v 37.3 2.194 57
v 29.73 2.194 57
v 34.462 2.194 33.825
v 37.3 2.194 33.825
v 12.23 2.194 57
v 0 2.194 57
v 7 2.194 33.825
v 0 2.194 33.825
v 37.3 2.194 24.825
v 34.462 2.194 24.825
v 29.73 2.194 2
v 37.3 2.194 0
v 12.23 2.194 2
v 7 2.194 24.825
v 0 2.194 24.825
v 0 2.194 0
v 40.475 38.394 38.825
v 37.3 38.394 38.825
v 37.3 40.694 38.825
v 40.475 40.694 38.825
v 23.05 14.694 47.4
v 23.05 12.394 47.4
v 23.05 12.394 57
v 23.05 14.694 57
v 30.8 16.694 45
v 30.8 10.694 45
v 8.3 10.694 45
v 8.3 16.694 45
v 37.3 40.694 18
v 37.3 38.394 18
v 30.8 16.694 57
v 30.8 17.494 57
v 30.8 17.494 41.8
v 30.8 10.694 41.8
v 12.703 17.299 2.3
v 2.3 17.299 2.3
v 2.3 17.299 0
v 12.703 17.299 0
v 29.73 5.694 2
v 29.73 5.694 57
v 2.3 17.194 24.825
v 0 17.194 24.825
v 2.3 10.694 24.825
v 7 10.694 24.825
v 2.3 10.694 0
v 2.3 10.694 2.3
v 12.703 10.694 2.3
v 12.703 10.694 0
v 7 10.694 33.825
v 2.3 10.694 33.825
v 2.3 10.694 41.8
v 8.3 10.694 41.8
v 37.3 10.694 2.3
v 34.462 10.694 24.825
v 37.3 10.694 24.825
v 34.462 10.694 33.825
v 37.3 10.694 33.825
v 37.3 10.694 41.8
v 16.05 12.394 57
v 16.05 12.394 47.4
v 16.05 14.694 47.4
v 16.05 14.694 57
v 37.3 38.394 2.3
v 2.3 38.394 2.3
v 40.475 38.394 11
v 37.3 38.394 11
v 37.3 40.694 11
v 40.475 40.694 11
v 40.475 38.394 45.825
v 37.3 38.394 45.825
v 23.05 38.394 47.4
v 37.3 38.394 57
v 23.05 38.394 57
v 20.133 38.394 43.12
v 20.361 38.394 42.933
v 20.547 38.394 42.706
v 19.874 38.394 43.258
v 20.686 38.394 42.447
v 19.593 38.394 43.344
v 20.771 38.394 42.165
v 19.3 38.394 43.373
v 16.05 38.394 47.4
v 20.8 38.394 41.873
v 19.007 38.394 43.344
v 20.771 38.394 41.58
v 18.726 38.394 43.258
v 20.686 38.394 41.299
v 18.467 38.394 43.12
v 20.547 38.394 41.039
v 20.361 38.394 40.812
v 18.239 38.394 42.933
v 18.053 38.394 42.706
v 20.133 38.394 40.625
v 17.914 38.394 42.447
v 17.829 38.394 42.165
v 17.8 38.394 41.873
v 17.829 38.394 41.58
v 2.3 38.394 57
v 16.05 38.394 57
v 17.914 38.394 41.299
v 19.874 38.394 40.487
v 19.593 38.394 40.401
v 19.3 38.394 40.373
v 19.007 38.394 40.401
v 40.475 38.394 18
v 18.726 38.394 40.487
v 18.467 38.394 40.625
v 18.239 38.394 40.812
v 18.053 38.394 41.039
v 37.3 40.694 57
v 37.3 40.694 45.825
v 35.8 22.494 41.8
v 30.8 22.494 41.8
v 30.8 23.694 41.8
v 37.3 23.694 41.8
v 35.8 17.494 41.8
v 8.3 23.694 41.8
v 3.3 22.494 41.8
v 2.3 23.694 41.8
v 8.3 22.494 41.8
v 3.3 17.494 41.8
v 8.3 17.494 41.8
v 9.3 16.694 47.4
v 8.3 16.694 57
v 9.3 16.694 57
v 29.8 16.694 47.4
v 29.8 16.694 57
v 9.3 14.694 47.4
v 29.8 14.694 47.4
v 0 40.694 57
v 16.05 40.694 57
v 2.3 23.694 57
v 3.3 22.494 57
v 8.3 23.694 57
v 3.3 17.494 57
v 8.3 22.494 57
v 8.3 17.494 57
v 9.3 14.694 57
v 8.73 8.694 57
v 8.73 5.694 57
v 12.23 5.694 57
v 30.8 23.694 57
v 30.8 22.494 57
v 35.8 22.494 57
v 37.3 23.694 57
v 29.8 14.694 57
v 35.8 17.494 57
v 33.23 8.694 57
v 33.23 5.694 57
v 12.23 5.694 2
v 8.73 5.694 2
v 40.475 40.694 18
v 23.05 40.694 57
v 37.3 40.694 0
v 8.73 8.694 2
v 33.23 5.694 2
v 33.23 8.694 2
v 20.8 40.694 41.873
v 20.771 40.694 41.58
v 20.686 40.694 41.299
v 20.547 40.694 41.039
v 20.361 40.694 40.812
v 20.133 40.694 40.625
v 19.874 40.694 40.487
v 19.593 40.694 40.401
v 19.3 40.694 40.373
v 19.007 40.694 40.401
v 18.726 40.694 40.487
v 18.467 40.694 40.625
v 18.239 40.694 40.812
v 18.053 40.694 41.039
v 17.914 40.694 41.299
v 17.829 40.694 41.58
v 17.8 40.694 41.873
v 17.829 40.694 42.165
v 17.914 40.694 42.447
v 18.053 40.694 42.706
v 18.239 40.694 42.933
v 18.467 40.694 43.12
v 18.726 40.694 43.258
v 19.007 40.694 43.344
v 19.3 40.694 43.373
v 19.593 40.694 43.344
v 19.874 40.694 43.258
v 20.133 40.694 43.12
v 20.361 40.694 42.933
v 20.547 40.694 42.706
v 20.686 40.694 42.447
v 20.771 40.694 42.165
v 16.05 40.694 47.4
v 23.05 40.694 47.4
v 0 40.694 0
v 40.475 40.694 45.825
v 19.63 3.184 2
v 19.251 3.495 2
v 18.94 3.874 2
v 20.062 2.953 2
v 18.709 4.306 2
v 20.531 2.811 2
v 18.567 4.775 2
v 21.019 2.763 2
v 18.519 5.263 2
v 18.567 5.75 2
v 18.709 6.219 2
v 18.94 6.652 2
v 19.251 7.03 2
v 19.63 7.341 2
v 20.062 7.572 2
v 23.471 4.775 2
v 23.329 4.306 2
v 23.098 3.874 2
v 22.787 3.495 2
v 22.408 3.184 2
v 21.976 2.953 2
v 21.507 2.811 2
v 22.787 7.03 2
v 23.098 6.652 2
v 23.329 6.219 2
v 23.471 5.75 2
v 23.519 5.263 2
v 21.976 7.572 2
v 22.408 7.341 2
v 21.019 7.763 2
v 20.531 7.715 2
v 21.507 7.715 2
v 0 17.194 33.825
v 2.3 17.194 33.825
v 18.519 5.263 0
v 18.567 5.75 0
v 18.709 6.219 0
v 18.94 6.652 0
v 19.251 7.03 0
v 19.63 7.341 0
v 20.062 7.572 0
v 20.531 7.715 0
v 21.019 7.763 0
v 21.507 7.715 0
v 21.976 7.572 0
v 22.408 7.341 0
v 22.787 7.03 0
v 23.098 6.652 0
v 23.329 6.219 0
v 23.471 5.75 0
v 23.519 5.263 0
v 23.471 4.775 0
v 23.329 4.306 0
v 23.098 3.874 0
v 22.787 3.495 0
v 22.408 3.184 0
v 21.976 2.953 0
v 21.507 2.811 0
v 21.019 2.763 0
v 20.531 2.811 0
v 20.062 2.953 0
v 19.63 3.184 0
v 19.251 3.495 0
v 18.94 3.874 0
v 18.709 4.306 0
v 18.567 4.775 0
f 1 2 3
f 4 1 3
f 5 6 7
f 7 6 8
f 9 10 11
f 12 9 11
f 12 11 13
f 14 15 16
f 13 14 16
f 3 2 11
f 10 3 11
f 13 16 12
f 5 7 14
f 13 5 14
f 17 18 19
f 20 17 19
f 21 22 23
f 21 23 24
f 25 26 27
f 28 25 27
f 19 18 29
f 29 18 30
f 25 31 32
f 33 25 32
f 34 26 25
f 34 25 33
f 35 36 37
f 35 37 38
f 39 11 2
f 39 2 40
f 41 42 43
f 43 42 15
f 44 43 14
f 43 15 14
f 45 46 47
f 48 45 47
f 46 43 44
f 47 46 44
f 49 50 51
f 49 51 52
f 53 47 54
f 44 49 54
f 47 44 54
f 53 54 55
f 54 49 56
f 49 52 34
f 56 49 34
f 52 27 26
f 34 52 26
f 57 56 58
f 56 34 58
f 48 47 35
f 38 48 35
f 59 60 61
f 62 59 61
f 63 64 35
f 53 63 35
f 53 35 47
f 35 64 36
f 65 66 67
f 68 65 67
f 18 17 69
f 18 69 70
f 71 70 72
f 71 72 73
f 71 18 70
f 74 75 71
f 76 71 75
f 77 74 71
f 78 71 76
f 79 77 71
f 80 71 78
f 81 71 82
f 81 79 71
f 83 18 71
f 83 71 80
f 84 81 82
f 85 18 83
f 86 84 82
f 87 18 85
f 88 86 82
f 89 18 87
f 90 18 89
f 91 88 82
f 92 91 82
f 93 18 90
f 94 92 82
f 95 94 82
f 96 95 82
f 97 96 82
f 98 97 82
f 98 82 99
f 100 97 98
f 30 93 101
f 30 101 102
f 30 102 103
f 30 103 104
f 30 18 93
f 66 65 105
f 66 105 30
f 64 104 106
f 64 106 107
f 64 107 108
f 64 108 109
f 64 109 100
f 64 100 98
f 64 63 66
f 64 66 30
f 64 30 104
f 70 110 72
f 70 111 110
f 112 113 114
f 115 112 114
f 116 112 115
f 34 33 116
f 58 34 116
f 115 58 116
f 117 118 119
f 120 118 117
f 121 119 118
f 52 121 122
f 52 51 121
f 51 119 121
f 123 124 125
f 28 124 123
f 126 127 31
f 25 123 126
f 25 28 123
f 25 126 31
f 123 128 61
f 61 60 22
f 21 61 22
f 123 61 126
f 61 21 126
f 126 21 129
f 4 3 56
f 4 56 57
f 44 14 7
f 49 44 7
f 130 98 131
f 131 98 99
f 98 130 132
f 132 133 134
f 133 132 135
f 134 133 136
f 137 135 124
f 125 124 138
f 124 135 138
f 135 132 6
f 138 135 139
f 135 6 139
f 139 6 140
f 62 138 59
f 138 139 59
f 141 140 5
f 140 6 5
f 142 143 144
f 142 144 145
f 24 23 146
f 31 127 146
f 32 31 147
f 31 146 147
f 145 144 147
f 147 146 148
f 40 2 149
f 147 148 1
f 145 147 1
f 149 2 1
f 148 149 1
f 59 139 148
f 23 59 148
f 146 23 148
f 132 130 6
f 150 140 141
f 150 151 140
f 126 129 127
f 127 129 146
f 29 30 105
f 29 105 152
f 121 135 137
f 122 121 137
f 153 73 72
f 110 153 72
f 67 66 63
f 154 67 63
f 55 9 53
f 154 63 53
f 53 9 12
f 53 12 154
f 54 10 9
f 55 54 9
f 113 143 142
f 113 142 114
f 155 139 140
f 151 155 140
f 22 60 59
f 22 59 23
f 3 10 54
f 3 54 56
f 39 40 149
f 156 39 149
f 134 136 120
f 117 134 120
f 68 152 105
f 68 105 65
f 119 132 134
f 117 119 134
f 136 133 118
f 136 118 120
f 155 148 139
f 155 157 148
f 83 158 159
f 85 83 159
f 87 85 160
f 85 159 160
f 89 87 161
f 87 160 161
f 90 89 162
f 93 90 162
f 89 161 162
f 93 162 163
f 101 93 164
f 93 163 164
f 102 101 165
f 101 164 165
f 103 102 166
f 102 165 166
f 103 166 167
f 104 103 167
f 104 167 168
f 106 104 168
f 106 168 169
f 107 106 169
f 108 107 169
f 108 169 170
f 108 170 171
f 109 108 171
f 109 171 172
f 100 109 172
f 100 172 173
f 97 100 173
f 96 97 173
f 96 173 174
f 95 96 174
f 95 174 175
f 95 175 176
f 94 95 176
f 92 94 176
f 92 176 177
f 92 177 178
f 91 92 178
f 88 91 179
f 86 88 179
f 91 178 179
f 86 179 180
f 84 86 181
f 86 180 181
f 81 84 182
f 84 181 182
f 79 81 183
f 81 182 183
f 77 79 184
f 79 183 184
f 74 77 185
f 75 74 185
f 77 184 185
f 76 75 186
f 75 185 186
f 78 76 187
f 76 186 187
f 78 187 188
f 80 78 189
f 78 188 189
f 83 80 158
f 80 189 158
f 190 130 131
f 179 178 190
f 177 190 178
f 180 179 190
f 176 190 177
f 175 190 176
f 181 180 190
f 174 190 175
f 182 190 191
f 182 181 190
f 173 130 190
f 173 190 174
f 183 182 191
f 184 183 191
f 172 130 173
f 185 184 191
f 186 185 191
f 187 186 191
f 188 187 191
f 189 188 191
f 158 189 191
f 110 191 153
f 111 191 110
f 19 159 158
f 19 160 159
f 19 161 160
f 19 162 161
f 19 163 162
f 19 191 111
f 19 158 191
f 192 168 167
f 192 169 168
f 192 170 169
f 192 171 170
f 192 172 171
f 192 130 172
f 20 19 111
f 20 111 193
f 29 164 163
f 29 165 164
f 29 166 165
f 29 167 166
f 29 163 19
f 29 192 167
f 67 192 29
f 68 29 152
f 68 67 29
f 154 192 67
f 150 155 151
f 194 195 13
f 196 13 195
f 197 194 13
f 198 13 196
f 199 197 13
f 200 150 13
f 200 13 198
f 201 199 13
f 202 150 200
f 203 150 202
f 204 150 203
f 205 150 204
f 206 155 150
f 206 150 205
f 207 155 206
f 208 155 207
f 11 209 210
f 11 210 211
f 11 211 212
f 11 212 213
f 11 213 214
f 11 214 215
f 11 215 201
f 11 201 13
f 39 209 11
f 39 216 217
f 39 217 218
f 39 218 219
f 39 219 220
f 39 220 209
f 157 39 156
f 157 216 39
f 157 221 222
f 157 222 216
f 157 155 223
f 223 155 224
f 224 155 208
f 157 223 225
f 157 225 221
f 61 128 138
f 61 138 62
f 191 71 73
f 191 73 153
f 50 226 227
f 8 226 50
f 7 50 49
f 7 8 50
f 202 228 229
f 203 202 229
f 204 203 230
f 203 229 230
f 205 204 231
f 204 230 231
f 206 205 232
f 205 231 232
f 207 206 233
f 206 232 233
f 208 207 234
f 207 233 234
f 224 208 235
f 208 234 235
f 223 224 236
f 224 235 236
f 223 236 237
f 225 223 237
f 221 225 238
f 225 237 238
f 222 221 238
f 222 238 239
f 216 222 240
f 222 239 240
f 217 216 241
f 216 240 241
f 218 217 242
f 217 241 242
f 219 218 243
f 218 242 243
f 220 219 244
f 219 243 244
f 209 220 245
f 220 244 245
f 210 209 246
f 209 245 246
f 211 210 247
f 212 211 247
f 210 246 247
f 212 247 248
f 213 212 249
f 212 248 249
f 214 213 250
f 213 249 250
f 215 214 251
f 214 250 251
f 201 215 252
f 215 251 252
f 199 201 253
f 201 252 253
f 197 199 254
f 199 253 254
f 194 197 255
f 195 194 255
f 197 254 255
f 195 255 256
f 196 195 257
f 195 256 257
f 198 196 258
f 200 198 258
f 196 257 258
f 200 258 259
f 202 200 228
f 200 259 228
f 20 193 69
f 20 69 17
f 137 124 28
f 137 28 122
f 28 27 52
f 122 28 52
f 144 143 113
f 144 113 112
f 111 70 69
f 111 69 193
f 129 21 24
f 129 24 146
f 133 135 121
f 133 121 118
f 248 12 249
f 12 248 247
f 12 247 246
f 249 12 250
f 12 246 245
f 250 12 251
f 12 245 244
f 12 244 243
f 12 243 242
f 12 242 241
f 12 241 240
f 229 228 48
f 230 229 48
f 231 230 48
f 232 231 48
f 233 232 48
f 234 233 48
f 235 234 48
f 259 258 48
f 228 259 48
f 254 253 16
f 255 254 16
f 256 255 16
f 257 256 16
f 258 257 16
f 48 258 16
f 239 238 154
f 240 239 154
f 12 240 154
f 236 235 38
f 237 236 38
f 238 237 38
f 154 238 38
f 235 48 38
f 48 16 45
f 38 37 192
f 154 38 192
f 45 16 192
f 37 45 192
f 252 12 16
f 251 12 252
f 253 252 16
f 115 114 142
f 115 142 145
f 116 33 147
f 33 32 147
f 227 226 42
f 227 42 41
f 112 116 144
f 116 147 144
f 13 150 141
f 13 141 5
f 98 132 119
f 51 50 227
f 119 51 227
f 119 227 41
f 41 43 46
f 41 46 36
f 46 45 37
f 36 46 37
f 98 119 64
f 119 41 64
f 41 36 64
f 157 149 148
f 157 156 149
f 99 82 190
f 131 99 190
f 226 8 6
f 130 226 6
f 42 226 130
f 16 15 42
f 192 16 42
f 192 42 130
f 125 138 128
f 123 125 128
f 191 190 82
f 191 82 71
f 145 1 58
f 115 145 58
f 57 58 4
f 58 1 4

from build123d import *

# Parameters (mm, degrees)
SKETCH1_W               = 53.825
SKETCH1_H               = 38.5
MAIN_EXTRUDE_DEPTH      = 2.3
WALLS_DEPTH             = 35
SKETCH36_W              = 7
SKETCH36_H              = 2.3
SKETCH36_W_2            = 2.3
SKETCH36_H_2            = 7
PUZZLE_MAIN_WALLS_DEPTH = 3.175
SKETCH25_W              = 10.403042977
SKETCH25_H              = 6.605151166
WIRE_HOLE_DEPTH         = 3.3
SKETCH19_W              = 6.5
SKETCH19_H              = 12.025
SKETCH19_W_2            = 6
IR_MOUNT_DEPTH          = 7
MAGNET_MOUNT_HOLE_DEPTH = 51.83
SKETCH40_R              = 1.5
LED_SPACE_DEPTH         = 3
SKETCH42_W              = 7
SKETCH42_H              = 2.3
BOSS_EXTRUDE15_DEPTH    = 3.175
SKETCH44_W              = 6
SKETCH44_H              = 12.025
SKETCH44_W_2            = 6.5
BOSS_EXTRUDE16_DEPTH    = 6
SKETCH45_W              = 5
SKETCH45_H              = 5
IR_PLACEMENT_DEPTH      = 12.025
SKETCH47_R              = 2.5
CUT_EXTRUDE2_DEPTH      = 2
SKETCH48_W              = 7
SKETCH48_H              = 9
CUT_EXTRUDE3_DEPTH      = 15
BOSS_EXTRUDE17_DEPTH    = 3.175
SKETCH51_W              = 22.5
SKETCH51_H              = 10
BOSS_EXTRUDE18_DEPTH    = 4
BOSS_EXTRUDE19_DEPTH    = 6
SKETCH54_W              = 7
SKETCH54_H              = 2.3
CUT_EXTRUDE5_DEPTH      = 9.6


with BuildPart() as part:
    # Sketch1 → main extrude (new body)
    with BuildSketch(Plane(origin=(0, 0, 0), x_dir=(0, 0, -1), z_dir=(1, 0, 0))):
        with Locations((-26.9125, 21.443980352)):
            Rectangle(SKETCH1_W, SKETCH1_H)
    extrude(amount=MAIN_EXTRUDE_DEPTH)

    # Sketch3 → walls (add)
    with BuildSketch(Plane(origin=(2.3, 0, 0), x_dir=(0, 0, -1), z_dir=(1, 0, 0))):
        Polygon((-2.3, 38.393980352), (-2.3, 10.693980352), (-53.825, 10.693980352), (-53.825, 2.193980352), (0, 2.193980352), (0, 40.693980352), (-53.825, 40.693980352), (-53.825, 38.393980352), align=None)
    extrude(amount=WALLS_DEPTH)

    # Sketch36 → Puzzle (main walls) (add)
    with BuildSketch(Plane.XY.offset(53.825)):
        with Locations((11.5, 39.543980352)):
            Rectangle(SKETCH36_W, SKETCH36_H)
        with Locations((26.5, 39.543980352)):
            Rectangle(SKETCH36_W, SKETCH36_H)
        with Locations((1.15, 29.193980352)):
            Rectangle(SKETCH36_W_2, SKETCH36_H_2)
        with Locations((1.15, 14.193980352)):
            Rectangle(SKETCH36_W_2, SKETCH36_H_2)
    extrude(amount=PUZZLE_MAIN_WALLS_DEPTH)

    # Sketch25 → Wire Hole (cut, through all)
    with BuildSketch(Plane.XY.offset(2.3)):
        with Locations((7.501521489, 13.996555935)):
            Rectangle(SKETCH25_W, SKETCH25_H)
    extrude(amount=-WIRE_HOLE_DEPTH, mode=Mode.SUBTRACT)

    # Sketch19 → IR mount (add)
    with BuildSketch(Plane(origin=(0, 10.693980352, 0), x_dir=(1, 0, 0), z_dir=(0, 1, 0))):
        with Locations((34.05, -47.8125)):
            Rectangle(SKETCH19_W, SKETCH19_H)
        with Locations((5.3, -47.8125)):
            Rectangle(SKETCH19_W_2, SKETCH19_H)
    extrude(amount=IR_MOUNT_DEPTH)

    # Sketch24 → Magnet Mount Hole (cut)
    with BuildSketch(Plane.XY.offset(53.83)):
        Polygon((12.23, 2.193980352), (29.73, 2.193980352), (29.73, 5.693980352), (33.23, 5.693980352), (33.23, 8.693980352), (8.73, 8.693980352), (8.73, 5.693980352), (12.23, 5.693980352), align=None)
    extrude(amount=-MAGNET_MOUNT_HOLE_DEPTH, mode=Mode.SUBTRACT)

    # Sketch40 → LED Space (cut)
    with BuildSketch(Plane(origin=(0, 40.693980352, 0), x_dir=(1, 0, 0), z_dir=(0, 1, 0))):
        with Locations((19.3, -41.872631961)):
            Circle(SKETCH40_R)
    extrude(amount=-LED_SPACE_DEPTH, mode=Mode.SUBTRACT)

    # Sketch42 → Boss-Extrude15 (add)
    with BuildSketch(Plane(origin=(37.3, 0, 0), x_dir=(0, 0, -1), z_dir=(1, 0, 0))):
        with Locations((-42.325, 39.543980352)):
            Rectangle(SKETCH42_W, SKETCH42_H)
        with Locations((-14.5, 39.543980352)):
            Rectangle(SKETCH42_W, SKETCH42_H)
    extrude(amount=BOSS_EXTRUDE15_DEPTH)

    # Sketch44 → Boss-Extrude16 (add)
    with BuildSketch(Plane(origin=(0, 17.693980352, 0), x_dir=(1, 0, 0), z_dir=(0, 1, 0))):
        with Locations((5.3, -47.8125)):
            Rectangle(SKETCH44_W, SKETCH44_H)
        with Locations((34.05, -47.8125)):
            Rectangle(SKETCH44_W_2, SKETCH44_H)
    extrude(amount=BOSS_EXTRUDE16_DEPTH)

    # Sketch45 → IR placement (cut)
    with BuildSketch(Plane.XY.offset(53.825)):
        with Locations((33.3, 19.993980352)):
            Rectangle(SKETCH45_W, SKETCH45_H)
        with Locations((5.8, 19.993980352)):
            Rectangle(SKETCH45_W, SKETCH45_H)
    extrude(amount=-IR_PLACEMENT_DEPTH, mode=Mode.SUBTRACT)

    # Sketch47 → Cut-Extrude2 (cut)
    with BuildSketch(Plane(origin=(0, 0, 0), x_dir=(-1, 0, 0), z_dir=(0, 0, -1))):
        with Locations((-21.018982331, 5.262699137)):
            Circle(SKETCH47_R)
    extrude(amount=-CUT_EXTRUDE2_DEPTH, mode=Mode.SUBTRACT)

    # Sketch48 → Cut-Extrude3 (cut)
    with BuildSketch(Plane.XZ.offset(-2.193980352)):
        with Locations((3.5, 29.325)):
            Rectangle(SKETCH48_W, SKETCH48_H)
        with Locations((37.962462444, 29.325)):
            Rectangle(SKETCH48_W, SKETCH48_H)
    extrude(amount=-CUT_EXTRUDE3_DEPTH, mode=Mode.SUBTRACT)

    # Sketch50 → Boss-Extrude17 (add)
    with BuildSketch(Plane.XY.offset(53.825)):
        Polygon((37.3, 38.393980352), (2.3, 38.393980352), (2.3, 23.693980352), (8.3, 23.693980352), (8.3, 22.493980352), (3.3, 22.493980352), (3.3, 17.493980352), (8.3, 17.493980352), (8.3, 10.693980352), (30.8, 10.693980352), (30.8, 17.493980352), (35.8, 17.493980352), (35.8, 22.493980352), (30.8, 22.493980352), (30.8, 23.693980352), (37.3, 23.693980352), (37.3, 2.193980352), (29.73, 2.193980352), (29.73, 5.693980352), (33.23, 5.693980352), (33.23, 8.693980352), (8.73, 8.693980352), (8.73, 5.693980352), (12.23, 5.693980352), (12.23, 2.193980352), (0, 2.193980352), (0, 40.693980352), (37.3, 40.693980352), align=None)
    extrude(amount=BOSS_EXTRUDE17_DEPTH)

    # Sketch51 → Boss-Extrude18 (add)
    with BuildSketch(Plane(origin=(0, 10.693980352, 0), x_dir=(1, 0, 0), z_dir=(0, 1, 0))):
        with Locations((19.55, -52)):
            Rectangle(SKETCH51_W, SKETCH51_H)
    extrude(amount=BOSS_EXTRUDE18_DEPTH)

    # Sketch52 → Boss-Extrude19 (add)
    with BuildSketch(Plane(origin=(0, 10.693980352, 0), x_dir=(1, 0, 0), z_dir=(0, 1, 0))):
        Polygon((9.3, -47.4), (29.8, -47.4), (29.8, -57), (30.8, -57), (30.8, -47), (30.8, -45), (8.3, -45), (8.3, -47), (8.3, -57), (9.3, -57), align=None)
    extrude(amount=BOSS_EXTRUDE19_DEPTH)

    # Sketch54 → Cut-Extrude5 (cut)
    with BuildSketch(Plane.XY.offset(57)):
        with Locations((19.55, 39.543980352)):
            Rectangle(SKETCH54_W, SKETCH54_H)
        with Locations((19.55, 13.543980352)):
            Rectangle(SKETCH54_W, SKETCH54_H)
    extrude(amount=-CUT_EXTRUDE5_DEPTH, mode=Mode.SUBTRACT)


solid = part.part
